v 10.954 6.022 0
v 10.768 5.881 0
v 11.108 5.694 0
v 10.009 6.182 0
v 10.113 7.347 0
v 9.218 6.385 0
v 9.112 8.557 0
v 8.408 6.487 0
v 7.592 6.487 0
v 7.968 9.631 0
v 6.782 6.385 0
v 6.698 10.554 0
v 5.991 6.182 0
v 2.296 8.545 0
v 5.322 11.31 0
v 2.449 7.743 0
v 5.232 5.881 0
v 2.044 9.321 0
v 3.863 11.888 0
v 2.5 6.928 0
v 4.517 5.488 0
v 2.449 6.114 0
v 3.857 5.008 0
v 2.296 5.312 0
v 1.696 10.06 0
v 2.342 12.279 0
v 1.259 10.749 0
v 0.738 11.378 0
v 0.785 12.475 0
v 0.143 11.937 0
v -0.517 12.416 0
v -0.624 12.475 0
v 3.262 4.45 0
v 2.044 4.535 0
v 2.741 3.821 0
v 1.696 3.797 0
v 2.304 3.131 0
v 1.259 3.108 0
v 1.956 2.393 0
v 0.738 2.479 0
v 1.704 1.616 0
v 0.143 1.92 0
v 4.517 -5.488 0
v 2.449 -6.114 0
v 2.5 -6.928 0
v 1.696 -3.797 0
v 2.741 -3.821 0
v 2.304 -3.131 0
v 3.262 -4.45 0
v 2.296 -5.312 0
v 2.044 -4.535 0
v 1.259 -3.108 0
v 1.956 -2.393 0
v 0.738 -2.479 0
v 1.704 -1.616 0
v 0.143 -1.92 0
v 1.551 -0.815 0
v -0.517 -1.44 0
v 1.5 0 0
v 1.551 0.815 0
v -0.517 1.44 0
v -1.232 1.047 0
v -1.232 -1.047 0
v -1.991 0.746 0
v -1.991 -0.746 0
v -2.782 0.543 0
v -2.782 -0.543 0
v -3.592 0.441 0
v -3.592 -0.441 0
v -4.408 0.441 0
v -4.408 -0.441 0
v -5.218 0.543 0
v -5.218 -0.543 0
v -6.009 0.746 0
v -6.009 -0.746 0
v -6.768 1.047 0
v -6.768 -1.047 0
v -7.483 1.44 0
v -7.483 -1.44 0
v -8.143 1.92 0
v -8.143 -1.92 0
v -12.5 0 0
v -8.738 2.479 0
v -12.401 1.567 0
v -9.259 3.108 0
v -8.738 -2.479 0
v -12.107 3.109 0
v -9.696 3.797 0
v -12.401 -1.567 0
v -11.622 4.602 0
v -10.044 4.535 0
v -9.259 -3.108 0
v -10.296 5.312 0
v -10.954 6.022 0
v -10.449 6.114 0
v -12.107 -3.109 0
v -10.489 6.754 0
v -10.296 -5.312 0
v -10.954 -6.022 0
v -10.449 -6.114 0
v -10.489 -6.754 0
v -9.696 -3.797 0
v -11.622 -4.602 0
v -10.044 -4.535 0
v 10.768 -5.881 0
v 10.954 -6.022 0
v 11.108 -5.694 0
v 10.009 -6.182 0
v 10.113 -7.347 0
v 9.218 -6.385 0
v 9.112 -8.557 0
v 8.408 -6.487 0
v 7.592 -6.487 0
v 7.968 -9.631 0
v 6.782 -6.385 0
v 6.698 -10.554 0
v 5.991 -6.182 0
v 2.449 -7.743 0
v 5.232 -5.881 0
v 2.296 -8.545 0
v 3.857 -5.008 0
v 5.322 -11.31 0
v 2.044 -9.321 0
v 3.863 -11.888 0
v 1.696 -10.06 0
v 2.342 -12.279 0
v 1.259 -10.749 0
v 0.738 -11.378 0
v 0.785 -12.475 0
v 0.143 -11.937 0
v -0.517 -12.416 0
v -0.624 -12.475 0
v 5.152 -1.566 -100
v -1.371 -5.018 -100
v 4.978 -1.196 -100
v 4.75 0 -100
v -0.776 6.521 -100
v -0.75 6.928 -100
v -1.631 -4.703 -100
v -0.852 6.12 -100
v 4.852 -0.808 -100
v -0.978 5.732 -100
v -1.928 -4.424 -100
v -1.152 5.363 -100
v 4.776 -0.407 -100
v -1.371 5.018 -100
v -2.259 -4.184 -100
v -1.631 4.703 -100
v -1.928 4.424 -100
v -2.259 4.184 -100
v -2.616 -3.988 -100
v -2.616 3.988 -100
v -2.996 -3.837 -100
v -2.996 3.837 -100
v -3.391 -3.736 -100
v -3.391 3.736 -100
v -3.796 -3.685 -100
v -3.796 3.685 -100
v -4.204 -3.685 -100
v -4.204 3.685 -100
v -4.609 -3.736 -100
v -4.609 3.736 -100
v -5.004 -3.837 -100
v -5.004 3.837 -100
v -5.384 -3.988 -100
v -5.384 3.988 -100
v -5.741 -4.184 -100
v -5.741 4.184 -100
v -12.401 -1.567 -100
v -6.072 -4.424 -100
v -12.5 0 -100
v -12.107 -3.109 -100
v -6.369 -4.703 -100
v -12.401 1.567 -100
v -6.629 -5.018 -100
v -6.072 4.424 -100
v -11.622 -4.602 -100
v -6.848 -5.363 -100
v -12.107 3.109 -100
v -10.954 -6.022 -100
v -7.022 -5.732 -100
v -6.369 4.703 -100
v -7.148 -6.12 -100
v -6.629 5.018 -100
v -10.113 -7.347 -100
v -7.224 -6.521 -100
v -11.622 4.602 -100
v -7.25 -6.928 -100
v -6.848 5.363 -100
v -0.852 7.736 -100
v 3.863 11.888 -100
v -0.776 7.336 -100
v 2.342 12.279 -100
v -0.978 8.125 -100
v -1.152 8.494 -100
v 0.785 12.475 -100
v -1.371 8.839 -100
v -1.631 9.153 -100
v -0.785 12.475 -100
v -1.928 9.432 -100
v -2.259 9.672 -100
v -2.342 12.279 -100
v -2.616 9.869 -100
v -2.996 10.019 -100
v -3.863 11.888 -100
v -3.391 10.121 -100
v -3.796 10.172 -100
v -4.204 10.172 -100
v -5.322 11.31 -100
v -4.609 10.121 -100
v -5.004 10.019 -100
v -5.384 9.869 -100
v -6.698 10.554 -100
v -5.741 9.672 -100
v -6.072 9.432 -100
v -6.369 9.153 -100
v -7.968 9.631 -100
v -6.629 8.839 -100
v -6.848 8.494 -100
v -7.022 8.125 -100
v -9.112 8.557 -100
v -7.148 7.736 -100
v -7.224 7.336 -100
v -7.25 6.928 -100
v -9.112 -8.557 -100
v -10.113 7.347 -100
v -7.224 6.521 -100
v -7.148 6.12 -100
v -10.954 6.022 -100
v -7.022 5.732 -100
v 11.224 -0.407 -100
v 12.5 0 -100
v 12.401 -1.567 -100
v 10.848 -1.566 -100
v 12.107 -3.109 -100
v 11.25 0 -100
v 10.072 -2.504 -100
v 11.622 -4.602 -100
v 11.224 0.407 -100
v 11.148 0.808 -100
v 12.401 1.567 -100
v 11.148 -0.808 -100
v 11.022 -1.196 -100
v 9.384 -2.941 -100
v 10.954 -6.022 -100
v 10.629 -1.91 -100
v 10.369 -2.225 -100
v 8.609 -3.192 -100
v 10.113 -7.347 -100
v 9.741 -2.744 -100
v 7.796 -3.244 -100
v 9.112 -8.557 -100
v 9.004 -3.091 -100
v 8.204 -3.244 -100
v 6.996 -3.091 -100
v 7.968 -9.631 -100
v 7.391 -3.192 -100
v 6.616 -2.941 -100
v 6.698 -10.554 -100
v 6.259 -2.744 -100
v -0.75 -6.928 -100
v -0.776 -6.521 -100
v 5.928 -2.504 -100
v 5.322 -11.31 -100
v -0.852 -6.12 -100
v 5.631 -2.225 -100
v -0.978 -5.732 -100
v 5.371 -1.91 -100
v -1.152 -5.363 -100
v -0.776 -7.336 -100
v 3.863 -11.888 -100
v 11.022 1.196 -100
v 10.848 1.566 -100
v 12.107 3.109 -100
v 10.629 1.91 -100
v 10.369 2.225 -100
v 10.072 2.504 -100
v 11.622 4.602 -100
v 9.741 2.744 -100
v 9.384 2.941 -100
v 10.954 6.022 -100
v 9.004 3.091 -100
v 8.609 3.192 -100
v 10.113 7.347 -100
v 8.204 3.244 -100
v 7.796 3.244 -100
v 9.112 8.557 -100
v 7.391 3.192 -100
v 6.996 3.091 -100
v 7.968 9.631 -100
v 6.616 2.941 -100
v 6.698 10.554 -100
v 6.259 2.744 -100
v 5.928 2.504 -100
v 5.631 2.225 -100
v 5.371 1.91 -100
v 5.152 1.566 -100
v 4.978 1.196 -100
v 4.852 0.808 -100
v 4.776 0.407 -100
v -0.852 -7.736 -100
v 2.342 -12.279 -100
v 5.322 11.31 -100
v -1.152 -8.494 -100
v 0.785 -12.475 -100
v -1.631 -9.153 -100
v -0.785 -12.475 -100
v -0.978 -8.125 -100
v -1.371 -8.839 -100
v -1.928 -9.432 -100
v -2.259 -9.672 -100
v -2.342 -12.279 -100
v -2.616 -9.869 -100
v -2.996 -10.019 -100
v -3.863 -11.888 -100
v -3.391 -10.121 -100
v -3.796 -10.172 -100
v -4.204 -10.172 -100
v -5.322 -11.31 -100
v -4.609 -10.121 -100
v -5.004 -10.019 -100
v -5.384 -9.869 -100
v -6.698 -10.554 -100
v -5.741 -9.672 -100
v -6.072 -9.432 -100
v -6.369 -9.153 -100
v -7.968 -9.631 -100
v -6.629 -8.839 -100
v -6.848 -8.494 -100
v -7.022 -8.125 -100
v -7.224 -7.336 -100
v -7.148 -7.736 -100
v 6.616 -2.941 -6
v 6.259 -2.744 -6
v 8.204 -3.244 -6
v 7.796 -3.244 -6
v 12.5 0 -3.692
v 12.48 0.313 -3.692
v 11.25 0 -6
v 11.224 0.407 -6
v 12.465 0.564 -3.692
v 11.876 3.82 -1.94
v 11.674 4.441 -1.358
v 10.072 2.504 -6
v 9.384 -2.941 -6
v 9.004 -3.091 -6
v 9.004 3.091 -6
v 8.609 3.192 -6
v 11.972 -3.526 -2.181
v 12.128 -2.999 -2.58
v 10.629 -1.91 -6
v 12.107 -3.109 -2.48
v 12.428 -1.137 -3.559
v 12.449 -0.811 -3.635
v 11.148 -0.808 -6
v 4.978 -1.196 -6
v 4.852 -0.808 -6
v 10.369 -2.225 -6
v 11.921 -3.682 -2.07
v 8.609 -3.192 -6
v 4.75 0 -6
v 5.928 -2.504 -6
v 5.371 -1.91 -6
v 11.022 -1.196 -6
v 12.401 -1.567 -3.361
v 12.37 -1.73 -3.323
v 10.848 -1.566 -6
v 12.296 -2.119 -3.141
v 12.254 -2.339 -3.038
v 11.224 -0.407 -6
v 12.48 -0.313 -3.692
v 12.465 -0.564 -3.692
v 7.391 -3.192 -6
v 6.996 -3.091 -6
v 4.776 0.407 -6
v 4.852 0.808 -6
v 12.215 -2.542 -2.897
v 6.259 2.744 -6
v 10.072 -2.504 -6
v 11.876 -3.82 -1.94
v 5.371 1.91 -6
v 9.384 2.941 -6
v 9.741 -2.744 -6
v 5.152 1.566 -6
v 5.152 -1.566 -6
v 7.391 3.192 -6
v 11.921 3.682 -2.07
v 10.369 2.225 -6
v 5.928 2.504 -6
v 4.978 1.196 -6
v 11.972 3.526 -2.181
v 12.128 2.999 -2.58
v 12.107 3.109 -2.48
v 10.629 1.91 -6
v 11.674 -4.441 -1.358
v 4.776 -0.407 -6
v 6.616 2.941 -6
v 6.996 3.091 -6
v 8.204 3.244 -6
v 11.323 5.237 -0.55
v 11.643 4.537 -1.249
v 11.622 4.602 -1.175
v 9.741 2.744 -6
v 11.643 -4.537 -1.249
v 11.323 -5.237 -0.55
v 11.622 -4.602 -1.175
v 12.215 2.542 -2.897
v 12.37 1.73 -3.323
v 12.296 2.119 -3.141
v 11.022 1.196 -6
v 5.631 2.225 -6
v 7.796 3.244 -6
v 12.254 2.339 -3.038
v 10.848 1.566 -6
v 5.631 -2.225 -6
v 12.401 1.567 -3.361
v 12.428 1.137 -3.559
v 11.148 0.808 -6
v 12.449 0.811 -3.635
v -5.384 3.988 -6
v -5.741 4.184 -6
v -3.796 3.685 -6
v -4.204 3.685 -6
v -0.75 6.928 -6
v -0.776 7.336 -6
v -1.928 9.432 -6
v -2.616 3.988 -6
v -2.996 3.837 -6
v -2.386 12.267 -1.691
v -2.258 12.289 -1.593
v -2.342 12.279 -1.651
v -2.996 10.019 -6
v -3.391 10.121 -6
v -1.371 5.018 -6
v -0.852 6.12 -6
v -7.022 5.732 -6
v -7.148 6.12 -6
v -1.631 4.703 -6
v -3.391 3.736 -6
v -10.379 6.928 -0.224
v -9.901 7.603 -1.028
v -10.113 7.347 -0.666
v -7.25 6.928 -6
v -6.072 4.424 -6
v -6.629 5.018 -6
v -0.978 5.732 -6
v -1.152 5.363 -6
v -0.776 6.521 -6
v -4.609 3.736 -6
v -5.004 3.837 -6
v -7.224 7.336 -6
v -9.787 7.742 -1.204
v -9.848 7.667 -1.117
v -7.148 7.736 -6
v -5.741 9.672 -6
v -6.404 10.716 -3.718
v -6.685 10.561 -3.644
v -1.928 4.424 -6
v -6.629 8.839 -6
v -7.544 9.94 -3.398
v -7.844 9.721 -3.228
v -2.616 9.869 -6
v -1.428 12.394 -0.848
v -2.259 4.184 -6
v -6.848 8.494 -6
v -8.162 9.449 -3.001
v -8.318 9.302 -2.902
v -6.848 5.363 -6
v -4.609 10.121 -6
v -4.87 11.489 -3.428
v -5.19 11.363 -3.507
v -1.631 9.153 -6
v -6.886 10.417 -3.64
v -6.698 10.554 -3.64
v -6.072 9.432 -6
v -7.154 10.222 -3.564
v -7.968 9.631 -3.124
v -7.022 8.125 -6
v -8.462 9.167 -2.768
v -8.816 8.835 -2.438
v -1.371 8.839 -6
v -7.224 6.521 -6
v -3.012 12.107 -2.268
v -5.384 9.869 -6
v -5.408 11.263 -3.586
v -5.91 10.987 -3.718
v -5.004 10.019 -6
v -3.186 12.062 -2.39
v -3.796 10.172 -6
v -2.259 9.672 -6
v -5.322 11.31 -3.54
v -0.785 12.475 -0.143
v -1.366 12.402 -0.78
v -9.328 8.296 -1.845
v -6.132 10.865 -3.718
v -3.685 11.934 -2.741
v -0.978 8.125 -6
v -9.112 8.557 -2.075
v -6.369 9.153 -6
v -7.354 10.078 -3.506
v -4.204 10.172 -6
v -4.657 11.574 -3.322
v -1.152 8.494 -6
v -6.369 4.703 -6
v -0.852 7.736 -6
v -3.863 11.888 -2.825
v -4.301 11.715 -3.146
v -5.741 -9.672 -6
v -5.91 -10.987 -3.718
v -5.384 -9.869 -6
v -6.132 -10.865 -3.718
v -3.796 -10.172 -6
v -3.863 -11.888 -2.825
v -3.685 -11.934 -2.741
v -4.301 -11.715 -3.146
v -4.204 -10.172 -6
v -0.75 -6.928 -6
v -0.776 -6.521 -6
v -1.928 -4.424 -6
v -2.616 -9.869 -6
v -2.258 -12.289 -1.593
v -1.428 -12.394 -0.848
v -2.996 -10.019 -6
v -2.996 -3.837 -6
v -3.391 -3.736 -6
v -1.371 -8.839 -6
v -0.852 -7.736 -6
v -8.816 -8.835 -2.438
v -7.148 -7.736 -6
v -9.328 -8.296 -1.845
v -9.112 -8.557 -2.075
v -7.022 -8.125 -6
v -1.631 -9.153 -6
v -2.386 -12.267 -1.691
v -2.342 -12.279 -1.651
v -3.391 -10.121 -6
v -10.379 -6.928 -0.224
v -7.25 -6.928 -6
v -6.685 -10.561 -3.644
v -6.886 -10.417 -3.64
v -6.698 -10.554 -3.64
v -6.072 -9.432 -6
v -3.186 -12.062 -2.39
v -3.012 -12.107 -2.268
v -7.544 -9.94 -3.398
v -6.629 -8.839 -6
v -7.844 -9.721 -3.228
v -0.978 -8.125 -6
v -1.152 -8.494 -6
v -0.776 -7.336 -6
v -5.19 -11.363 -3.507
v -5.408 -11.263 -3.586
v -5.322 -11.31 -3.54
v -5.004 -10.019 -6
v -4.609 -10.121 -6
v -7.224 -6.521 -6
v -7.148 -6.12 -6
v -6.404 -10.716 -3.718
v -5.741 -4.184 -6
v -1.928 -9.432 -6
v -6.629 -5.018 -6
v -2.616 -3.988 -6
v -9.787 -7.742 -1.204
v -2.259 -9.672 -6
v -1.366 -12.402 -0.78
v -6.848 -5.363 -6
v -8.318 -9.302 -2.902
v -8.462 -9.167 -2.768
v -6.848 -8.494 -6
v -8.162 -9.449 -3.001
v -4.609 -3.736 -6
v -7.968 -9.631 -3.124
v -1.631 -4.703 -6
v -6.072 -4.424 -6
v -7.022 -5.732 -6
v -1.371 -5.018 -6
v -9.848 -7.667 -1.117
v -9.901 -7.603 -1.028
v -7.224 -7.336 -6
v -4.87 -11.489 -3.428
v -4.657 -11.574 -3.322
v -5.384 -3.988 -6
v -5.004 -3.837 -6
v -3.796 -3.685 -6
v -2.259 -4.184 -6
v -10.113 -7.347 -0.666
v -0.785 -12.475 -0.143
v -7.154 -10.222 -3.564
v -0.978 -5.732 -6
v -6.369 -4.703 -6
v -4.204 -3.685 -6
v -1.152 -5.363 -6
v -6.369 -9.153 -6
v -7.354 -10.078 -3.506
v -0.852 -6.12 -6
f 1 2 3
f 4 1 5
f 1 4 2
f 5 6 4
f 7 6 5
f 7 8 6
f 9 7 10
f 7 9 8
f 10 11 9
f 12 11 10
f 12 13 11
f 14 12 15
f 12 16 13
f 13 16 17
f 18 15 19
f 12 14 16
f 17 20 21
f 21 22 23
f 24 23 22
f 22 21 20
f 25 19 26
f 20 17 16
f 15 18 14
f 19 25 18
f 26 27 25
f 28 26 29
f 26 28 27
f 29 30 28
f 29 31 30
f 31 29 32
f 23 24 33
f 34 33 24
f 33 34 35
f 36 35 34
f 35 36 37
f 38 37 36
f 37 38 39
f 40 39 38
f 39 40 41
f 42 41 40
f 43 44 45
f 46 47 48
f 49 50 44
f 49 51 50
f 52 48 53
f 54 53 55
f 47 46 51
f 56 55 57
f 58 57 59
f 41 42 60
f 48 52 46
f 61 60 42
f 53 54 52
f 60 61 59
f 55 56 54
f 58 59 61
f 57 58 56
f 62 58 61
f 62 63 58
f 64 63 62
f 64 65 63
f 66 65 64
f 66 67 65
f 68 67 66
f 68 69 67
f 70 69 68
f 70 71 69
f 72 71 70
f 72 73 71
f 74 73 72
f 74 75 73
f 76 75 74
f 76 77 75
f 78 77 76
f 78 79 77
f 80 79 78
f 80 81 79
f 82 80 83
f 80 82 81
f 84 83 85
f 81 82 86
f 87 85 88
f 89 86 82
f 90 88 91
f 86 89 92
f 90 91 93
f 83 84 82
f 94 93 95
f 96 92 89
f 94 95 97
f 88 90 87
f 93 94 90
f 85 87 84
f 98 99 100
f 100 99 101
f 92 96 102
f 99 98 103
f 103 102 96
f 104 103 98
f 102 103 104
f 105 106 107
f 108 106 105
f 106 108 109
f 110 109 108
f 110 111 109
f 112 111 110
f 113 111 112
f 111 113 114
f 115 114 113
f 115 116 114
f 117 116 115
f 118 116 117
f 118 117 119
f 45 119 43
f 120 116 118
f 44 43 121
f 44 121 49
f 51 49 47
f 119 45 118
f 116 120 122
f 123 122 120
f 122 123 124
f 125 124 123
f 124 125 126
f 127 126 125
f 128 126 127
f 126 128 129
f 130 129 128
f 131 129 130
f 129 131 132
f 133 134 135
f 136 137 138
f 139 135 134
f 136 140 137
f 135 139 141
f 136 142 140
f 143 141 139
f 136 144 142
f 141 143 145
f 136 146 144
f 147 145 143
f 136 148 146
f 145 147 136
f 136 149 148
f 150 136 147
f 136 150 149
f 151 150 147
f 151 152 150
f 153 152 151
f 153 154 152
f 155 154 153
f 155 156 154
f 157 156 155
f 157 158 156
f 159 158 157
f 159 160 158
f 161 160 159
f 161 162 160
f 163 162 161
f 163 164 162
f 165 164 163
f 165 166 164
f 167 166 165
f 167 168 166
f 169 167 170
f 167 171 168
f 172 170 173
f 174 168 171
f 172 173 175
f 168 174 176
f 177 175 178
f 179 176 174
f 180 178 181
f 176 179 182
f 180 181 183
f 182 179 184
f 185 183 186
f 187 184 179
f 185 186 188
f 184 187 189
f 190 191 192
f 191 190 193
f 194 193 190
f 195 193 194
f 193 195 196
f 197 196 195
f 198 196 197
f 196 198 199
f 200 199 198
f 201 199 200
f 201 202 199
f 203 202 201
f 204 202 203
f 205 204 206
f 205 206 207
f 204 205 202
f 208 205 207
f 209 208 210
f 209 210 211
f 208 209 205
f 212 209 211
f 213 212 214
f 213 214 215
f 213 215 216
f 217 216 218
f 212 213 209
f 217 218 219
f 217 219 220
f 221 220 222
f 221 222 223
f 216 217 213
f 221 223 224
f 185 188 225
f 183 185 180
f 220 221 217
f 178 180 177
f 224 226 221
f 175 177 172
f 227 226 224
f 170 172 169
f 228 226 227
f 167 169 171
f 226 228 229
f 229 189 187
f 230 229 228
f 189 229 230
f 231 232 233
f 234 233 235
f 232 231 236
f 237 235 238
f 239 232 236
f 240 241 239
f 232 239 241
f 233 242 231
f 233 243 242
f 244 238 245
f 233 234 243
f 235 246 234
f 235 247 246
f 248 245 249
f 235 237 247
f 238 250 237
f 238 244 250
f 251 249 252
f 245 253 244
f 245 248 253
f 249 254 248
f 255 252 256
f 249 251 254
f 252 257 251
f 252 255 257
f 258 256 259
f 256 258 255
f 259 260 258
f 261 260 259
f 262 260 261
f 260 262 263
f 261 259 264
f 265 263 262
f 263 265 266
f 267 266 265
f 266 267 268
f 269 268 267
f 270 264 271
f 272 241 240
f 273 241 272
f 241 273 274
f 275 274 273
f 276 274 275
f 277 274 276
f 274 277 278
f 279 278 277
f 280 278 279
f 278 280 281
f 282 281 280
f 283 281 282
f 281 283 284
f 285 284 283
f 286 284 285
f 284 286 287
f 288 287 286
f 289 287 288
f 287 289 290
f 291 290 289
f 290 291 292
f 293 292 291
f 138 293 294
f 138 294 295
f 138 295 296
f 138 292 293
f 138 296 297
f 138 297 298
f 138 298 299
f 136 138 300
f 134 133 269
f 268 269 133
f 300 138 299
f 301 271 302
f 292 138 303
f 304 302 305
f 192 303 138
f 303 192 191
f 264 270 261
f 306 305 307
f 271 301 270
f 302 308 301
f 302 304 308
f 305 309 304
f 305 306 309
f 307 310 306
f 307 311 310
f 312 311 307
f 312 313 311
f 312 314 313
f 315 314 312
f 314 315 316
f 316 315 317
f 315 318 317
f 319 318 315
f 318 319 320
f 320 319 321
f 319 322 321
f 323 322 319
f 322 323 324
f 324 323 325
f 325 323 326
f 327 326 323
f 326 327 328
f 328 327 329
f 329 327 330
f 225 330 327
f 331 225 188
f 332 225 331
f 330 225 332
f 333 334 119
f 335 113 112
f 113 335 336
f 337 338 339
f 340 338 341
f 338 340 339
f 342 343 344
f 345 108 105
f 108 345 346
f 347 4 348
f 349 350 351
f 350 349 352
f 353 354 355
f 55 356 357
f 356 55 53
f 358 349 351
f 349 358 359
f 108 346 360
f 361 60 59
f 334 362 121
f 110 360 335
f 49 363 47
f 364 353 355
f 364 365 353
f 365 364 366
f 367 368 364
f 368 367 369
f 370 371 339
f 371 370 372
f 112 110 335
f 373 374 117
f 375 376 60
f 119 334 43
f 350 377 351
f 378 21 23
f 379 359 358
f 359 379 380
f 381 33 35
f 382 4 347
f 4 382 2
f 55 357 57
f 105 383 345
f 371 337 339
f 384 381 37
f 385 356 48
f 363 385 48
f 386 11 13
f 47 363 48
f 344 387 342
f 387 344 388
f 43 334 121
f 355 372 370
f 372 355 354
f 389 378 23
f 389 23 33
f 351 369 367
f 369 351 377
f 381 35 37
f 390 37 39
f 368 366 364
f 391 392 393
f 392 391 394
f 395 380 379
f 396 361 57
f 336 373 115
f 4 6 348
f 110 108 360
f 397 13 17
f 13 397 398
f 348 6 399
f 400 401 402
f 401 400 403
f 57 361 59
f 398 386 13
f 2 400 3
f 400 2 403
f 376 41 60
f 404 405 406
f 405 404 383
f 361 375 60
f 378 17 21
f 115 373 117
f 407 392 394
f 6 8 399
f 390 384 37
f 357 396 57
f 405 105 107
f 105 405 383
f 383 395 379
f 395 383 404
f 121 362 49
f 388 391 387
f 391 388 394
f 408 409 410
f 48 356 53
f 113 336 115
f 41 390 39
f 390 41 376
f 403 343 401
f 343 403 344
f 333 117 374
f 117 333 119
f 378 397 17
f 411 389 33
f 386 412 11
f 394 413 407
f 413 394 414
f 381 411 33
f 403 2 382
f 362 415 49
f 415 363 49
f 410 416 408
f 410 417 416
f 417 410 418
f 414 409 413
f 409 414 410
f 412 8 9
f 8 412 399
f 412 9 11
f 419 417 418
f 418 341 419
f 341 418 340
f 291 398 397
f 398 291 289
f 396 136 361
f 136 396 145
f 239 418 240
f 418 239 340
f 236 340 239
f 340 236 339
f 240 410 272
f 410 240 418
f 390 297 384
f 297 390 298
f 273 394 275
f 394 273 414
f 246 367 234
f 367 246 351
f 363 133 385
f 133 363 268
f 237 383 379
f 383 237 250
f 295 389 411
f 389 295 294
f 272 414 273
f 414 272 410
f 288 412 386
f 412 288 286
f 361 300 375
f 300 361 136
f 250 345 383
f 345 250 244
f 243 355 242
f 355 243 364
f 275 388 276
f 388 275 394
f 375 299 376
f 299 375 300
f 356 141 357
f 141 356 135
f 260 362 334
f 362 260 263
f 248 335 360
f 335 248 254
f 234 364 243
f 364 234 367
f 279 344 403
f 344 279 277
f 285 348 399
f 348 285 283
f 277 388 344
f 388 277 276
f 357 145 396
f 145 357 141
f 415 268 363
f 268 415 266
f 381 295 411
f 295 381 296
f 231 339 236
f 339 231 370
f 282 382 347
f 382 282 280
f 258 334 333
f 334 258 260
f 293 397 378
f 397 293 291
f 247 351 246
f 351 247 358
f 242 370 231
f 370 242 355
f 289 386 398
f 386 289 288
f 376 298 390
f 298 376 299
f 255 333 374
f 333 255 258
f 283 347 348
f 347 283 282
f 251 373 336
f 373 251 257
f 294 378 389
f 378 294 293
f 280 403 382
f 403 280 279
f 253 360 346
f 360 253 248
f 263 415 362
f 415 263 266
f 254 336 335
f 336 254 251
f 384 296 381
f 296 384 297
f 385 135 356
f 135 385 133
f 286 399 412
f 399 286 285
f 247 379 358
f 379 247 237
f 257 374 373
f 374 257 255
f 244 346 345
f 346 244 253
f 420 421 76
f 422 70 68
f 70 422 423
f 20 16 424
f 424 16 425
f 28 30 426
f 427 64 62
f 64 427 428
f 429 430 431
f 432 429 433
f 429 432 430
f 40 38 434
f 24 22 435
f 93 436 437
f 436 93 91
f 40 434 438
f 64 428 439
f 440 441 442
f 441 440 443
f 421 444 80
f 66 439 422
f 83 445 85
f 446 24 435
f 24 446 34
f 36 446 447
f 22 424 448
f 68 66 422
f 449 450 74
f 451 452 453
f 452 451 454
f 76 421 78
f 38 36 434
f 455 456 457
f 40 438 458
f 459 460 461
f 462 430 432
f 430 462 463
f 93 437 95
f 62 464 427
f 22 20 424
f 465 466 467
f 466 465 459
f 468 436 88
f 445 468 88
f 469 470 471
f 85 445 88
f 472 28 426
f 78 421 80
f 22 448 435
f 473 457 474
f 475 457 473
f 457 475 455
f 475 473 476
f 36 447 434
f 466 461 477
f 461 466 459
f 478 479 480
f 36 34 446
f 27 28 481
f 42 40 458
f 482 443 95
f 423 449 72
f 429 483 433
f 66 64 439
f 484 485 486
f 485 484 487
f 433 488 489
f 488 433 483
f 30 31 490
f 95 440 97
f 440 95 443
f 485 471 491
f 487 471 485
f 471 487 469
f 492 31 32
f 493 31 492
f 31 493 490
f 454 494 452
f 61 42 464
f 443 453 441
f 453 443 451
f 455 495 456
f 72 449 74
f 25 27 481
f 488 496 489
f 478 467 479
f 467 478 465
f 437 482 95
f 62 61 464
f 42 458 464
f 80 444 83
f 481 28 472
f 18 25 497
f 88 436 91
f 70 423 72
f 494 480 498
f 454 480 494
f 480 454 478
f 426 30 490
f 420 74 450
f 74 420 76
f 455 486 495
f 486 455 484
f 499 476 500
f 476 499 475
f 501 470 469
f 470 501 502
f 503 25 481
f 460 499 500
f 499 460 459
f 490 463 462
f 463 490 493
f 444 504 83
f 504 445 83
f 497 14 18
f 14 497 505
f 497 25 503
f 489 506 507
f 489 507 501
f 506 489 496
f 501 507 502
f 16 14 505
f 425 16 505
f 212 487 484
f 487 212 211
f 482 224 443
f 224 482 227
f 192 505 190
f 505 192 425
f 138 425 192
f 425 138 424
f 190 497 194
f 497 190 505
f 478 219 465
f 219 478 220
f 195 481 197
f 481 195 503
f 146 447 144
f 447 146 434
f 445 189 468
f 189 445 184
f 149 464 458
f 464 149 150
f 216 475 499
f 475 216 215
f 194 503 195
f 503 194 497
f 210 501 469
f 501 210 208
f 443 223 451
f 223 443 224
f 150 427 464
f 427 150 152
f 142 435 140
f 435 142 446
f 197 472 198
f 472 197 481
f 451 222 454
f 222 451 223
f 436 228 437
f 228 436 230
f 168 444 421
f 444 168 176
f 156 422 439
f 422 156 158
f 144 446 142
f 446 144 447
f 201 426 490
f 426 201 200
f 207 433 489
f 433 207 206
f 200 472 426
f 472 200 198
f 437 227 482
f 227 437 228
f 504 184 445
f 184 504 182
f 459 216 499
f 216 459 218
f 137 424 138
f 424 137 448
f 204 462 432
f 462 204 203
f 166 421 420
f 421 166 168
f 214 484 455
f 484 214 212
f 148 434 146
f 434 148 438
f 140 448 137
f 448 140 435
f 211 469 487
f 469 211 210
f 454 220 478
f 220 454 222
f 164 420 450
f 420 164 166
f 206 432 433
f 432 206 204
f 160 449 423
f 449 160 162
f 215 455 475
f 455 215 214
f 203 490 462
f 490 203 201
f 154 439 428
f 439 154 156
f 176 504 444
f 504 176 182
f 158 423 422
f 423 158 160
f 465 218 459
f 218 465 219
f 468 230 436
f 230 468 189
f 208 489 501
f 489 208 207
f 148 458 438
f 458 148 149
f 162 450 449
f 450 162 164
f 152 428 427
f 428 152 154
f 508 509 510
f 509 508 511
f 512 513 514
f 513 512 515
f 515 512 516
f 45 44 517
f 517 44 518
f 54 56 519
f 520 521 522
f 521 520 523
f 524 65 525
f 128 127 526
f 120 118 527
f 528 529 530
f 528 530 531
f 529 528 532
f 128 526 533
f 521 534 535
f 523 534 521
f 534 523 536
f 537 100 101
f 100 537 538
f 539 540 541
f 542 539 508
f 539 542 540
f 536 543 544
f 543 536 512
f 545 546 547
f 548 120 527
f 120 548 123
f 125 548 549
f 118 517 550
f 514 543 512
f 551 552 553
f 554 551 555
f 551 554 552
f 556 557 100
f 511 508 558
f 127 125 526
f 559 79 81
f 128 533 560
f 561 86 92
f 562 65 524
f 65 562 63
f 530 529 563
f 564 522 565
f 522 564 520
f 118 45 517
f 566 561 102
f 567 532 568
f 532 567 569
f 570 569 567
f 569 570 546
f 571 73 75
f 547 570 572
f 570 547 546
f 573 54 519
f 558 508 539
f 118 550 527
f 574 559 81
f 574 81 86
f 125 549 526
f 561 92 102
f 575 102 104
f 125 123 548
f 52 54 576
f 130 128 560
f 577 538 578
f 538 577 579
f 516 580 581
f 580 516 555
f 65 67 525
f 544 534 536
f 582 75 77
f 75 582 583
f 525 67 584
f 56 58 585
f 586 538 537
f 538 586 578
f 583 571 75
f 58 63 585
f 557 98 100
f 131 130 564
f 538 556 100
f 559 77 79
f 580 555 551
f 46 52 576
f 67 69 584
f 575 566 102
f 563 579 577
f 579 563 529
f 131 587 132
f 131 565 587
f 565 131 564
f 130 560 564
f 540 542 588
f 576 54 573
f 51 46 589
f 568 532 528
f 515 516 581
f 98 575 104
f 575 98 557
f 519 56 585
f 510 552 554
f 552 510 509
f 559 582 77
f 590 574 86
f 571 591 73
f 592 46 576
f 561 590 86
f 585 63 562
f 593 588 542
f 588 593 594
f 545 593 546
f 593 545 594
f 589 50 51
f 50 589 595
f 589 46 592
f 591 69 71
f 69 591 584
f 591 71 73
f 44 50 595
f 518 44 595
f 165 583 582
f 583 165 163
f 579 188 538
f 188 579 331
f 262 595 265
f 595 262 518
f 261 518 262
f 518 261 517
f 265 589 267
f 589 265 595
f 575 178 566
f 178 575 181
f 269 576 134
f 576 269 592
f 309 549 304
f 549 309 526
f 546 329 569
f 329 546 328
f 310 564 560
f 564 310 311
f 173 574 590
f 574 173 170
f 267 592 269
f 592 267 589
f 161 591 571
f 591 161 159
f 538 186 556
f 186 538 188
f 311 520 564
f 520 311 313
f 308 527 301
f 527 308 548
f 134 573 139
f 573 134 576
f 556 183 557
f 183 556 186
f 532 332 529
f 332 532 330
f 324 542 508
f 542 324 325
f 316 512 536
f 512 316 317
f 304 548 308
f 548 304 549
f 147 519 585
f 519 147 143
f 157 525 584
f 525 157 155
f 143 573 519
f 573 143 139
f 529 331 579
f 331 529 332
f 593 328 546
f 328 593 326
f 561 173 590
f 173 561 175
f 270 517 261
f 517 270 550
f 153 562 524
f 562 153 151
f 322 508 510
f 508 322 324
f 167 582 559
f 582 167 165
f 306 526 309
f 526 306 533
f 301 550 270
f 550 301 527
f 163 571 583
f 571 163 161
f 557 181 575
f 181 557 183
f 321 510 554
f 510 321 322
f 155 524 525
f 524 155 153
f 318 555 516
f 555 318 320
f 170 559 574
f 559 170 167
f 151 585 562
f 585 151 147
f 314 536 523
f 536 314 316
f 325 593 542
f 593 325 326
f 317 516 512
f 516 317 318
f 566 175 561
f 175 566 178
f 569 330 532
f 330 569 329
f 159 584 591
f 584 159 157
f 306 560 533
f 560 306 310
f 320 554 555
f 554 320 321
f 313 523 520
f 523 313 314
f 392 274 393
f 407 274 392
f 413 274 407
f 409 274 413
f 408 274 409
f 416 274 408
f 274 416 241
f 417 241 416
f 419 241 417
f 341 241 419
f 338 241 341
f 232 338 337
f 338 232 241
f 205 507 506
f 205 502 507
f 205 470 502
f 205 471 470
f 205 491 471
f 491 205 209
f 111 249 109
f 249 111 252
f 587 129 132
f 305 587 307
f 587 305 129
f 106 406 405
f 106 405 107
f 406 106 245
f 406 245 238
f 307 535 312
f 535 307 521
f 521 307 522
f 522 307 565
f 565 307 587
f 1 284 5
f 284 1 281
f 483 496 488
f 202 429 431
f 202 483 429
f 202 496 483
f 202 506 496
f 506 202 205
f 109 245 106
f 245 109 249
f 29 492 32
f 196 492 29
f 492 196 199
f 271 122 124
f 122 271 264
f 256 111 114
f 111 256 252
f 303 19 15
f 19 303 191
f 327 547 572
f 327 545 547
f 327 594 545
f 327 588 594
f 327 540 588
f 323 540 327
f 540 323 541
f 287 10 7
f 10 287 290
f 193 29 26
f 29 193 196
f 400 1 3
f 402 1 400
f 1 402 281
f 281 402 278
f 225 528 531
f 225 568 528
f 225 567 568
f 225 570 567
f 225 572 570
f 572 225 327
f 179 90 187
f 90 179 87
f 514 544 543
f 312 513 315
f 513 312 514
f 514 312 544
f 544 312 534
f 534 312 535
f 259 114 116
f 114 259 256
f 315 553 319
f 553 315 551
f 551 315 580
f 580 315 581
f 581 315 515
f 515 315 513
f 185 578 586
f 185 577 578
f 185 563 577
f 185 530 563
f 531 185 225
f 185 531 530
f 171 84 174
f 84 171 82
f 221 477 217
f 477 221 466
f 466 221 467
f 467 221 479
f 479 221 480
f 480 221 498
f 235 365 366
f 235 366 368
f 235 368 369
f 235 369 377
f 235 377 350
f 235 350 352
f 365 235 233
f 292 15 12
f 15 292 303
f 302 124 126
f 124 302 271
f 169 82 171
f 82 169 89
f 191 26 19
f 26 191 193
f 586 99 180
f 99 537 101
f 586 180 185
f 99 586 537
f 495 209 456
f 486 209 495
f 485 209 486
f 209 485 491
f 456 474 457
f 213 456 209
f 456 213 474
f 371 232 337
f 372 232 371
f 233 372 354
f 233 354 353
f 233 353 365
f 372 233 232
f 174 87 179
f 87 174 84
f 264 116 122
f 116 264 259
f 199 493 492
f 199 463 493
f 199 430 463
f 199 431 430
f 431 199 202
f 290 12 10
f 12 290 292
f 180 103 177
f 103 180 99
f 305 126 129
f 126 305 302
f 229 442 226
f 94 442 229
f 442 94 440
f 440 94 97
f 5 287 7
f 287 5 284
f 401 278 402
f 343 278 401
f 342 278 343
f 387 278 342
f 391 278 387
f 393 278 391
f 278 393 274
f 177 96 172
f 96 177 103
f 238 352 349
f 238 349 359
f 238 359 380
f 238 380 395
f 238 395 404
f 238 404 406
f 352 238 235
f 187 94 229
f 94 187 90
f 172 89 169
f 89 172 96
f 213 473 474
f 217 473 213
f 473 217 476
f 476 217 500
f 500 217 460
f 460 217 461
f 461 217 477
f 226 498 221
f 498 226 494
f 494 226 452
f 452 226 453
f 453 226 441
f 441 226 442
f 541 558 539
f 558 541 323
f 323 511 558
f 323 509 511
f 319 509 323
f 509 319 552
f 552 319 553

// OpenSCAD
$fn = 50;


difference() {
	union() {
		translate(v = [0, 0, -100.0000000000]) {
			cylinder(h = 100, r = 12.5000000000);
		}
	}
	union() {
		translate(v = [8.0000000000, 0.0000000000, 0]) {
			rotate(a = [0, 0, 0]) {
				difference() {
					union() {
						#translate(v = [0, 0, -100.0000000000]) {
							cylinder(h = 100, r = 2.2500000000);
						}
						#translate(v = [0, 0, -6]) {
							cylinder(h = 6, r = 12.5000000000, r1 = 3.2500000000, r2 = 6.5000000000);
						}
						#translate(v = [0, 0, -100.0000000000]) {
							cylinder(h = 100, r = 3.2500000000);
						}
						#translate(v = [0, 0, -100.0000000000]) {
							cylinder(h = 100, r = 2.2500000000);
						}
					}
					union();
				}
			}
		}
		translate(v = [-4.0000000000, 6.9282032303, 0]) {
			rotate(a = [0, 0, 0]) {
				difference() {
					union() {
						#translate(v = [0, 0, -100.0000000000]) {
							cylinder(h = 100, r = 2.2500000000);
						}
						#translate(v = [0, 0, -6]) {
							cylinder(h = 6, r = 12.5000000000, r1 = 3.2500000000, r2 = 6.5000000000);
						}
						#translate(v = [0, 0, -100.0000000000]) {
							cylinder(h = 100, r = 3.2500000000);
						}
						#translate(v = [0, 0, -100.0000000000]) {
							cylinder(h = 100, r = 2.2500000000);
						}
					}
					union();
				}
			}
		}
		translate(v = [-4.0000000000, -6.9282032303, 0]) {
			rotate(a = [0, 0, 0]) {
				difference() {
					union() {
						#translate(v = [0, 0, -100.0000000000]) {
							cylinder(h = 100, r = 2.2500000000);
						}
						#translate(v = [0, 0, -6]) {
							cylinder(h = 6, r = 12.5000000000, r1 = 3.2500000000, r2 = 6.5000000000);
						}
						#translate(v = [0, 0, -100.0000000000]) {
							cylinder(h = 100, r = 3.2500000000);
						}
						#translate(v = [0, 0, -100.0000000000]) {
							cylinder(h = 100, r = 2.2500000000);
						}
					}
					union();
				}
			}
		}
	}
}
